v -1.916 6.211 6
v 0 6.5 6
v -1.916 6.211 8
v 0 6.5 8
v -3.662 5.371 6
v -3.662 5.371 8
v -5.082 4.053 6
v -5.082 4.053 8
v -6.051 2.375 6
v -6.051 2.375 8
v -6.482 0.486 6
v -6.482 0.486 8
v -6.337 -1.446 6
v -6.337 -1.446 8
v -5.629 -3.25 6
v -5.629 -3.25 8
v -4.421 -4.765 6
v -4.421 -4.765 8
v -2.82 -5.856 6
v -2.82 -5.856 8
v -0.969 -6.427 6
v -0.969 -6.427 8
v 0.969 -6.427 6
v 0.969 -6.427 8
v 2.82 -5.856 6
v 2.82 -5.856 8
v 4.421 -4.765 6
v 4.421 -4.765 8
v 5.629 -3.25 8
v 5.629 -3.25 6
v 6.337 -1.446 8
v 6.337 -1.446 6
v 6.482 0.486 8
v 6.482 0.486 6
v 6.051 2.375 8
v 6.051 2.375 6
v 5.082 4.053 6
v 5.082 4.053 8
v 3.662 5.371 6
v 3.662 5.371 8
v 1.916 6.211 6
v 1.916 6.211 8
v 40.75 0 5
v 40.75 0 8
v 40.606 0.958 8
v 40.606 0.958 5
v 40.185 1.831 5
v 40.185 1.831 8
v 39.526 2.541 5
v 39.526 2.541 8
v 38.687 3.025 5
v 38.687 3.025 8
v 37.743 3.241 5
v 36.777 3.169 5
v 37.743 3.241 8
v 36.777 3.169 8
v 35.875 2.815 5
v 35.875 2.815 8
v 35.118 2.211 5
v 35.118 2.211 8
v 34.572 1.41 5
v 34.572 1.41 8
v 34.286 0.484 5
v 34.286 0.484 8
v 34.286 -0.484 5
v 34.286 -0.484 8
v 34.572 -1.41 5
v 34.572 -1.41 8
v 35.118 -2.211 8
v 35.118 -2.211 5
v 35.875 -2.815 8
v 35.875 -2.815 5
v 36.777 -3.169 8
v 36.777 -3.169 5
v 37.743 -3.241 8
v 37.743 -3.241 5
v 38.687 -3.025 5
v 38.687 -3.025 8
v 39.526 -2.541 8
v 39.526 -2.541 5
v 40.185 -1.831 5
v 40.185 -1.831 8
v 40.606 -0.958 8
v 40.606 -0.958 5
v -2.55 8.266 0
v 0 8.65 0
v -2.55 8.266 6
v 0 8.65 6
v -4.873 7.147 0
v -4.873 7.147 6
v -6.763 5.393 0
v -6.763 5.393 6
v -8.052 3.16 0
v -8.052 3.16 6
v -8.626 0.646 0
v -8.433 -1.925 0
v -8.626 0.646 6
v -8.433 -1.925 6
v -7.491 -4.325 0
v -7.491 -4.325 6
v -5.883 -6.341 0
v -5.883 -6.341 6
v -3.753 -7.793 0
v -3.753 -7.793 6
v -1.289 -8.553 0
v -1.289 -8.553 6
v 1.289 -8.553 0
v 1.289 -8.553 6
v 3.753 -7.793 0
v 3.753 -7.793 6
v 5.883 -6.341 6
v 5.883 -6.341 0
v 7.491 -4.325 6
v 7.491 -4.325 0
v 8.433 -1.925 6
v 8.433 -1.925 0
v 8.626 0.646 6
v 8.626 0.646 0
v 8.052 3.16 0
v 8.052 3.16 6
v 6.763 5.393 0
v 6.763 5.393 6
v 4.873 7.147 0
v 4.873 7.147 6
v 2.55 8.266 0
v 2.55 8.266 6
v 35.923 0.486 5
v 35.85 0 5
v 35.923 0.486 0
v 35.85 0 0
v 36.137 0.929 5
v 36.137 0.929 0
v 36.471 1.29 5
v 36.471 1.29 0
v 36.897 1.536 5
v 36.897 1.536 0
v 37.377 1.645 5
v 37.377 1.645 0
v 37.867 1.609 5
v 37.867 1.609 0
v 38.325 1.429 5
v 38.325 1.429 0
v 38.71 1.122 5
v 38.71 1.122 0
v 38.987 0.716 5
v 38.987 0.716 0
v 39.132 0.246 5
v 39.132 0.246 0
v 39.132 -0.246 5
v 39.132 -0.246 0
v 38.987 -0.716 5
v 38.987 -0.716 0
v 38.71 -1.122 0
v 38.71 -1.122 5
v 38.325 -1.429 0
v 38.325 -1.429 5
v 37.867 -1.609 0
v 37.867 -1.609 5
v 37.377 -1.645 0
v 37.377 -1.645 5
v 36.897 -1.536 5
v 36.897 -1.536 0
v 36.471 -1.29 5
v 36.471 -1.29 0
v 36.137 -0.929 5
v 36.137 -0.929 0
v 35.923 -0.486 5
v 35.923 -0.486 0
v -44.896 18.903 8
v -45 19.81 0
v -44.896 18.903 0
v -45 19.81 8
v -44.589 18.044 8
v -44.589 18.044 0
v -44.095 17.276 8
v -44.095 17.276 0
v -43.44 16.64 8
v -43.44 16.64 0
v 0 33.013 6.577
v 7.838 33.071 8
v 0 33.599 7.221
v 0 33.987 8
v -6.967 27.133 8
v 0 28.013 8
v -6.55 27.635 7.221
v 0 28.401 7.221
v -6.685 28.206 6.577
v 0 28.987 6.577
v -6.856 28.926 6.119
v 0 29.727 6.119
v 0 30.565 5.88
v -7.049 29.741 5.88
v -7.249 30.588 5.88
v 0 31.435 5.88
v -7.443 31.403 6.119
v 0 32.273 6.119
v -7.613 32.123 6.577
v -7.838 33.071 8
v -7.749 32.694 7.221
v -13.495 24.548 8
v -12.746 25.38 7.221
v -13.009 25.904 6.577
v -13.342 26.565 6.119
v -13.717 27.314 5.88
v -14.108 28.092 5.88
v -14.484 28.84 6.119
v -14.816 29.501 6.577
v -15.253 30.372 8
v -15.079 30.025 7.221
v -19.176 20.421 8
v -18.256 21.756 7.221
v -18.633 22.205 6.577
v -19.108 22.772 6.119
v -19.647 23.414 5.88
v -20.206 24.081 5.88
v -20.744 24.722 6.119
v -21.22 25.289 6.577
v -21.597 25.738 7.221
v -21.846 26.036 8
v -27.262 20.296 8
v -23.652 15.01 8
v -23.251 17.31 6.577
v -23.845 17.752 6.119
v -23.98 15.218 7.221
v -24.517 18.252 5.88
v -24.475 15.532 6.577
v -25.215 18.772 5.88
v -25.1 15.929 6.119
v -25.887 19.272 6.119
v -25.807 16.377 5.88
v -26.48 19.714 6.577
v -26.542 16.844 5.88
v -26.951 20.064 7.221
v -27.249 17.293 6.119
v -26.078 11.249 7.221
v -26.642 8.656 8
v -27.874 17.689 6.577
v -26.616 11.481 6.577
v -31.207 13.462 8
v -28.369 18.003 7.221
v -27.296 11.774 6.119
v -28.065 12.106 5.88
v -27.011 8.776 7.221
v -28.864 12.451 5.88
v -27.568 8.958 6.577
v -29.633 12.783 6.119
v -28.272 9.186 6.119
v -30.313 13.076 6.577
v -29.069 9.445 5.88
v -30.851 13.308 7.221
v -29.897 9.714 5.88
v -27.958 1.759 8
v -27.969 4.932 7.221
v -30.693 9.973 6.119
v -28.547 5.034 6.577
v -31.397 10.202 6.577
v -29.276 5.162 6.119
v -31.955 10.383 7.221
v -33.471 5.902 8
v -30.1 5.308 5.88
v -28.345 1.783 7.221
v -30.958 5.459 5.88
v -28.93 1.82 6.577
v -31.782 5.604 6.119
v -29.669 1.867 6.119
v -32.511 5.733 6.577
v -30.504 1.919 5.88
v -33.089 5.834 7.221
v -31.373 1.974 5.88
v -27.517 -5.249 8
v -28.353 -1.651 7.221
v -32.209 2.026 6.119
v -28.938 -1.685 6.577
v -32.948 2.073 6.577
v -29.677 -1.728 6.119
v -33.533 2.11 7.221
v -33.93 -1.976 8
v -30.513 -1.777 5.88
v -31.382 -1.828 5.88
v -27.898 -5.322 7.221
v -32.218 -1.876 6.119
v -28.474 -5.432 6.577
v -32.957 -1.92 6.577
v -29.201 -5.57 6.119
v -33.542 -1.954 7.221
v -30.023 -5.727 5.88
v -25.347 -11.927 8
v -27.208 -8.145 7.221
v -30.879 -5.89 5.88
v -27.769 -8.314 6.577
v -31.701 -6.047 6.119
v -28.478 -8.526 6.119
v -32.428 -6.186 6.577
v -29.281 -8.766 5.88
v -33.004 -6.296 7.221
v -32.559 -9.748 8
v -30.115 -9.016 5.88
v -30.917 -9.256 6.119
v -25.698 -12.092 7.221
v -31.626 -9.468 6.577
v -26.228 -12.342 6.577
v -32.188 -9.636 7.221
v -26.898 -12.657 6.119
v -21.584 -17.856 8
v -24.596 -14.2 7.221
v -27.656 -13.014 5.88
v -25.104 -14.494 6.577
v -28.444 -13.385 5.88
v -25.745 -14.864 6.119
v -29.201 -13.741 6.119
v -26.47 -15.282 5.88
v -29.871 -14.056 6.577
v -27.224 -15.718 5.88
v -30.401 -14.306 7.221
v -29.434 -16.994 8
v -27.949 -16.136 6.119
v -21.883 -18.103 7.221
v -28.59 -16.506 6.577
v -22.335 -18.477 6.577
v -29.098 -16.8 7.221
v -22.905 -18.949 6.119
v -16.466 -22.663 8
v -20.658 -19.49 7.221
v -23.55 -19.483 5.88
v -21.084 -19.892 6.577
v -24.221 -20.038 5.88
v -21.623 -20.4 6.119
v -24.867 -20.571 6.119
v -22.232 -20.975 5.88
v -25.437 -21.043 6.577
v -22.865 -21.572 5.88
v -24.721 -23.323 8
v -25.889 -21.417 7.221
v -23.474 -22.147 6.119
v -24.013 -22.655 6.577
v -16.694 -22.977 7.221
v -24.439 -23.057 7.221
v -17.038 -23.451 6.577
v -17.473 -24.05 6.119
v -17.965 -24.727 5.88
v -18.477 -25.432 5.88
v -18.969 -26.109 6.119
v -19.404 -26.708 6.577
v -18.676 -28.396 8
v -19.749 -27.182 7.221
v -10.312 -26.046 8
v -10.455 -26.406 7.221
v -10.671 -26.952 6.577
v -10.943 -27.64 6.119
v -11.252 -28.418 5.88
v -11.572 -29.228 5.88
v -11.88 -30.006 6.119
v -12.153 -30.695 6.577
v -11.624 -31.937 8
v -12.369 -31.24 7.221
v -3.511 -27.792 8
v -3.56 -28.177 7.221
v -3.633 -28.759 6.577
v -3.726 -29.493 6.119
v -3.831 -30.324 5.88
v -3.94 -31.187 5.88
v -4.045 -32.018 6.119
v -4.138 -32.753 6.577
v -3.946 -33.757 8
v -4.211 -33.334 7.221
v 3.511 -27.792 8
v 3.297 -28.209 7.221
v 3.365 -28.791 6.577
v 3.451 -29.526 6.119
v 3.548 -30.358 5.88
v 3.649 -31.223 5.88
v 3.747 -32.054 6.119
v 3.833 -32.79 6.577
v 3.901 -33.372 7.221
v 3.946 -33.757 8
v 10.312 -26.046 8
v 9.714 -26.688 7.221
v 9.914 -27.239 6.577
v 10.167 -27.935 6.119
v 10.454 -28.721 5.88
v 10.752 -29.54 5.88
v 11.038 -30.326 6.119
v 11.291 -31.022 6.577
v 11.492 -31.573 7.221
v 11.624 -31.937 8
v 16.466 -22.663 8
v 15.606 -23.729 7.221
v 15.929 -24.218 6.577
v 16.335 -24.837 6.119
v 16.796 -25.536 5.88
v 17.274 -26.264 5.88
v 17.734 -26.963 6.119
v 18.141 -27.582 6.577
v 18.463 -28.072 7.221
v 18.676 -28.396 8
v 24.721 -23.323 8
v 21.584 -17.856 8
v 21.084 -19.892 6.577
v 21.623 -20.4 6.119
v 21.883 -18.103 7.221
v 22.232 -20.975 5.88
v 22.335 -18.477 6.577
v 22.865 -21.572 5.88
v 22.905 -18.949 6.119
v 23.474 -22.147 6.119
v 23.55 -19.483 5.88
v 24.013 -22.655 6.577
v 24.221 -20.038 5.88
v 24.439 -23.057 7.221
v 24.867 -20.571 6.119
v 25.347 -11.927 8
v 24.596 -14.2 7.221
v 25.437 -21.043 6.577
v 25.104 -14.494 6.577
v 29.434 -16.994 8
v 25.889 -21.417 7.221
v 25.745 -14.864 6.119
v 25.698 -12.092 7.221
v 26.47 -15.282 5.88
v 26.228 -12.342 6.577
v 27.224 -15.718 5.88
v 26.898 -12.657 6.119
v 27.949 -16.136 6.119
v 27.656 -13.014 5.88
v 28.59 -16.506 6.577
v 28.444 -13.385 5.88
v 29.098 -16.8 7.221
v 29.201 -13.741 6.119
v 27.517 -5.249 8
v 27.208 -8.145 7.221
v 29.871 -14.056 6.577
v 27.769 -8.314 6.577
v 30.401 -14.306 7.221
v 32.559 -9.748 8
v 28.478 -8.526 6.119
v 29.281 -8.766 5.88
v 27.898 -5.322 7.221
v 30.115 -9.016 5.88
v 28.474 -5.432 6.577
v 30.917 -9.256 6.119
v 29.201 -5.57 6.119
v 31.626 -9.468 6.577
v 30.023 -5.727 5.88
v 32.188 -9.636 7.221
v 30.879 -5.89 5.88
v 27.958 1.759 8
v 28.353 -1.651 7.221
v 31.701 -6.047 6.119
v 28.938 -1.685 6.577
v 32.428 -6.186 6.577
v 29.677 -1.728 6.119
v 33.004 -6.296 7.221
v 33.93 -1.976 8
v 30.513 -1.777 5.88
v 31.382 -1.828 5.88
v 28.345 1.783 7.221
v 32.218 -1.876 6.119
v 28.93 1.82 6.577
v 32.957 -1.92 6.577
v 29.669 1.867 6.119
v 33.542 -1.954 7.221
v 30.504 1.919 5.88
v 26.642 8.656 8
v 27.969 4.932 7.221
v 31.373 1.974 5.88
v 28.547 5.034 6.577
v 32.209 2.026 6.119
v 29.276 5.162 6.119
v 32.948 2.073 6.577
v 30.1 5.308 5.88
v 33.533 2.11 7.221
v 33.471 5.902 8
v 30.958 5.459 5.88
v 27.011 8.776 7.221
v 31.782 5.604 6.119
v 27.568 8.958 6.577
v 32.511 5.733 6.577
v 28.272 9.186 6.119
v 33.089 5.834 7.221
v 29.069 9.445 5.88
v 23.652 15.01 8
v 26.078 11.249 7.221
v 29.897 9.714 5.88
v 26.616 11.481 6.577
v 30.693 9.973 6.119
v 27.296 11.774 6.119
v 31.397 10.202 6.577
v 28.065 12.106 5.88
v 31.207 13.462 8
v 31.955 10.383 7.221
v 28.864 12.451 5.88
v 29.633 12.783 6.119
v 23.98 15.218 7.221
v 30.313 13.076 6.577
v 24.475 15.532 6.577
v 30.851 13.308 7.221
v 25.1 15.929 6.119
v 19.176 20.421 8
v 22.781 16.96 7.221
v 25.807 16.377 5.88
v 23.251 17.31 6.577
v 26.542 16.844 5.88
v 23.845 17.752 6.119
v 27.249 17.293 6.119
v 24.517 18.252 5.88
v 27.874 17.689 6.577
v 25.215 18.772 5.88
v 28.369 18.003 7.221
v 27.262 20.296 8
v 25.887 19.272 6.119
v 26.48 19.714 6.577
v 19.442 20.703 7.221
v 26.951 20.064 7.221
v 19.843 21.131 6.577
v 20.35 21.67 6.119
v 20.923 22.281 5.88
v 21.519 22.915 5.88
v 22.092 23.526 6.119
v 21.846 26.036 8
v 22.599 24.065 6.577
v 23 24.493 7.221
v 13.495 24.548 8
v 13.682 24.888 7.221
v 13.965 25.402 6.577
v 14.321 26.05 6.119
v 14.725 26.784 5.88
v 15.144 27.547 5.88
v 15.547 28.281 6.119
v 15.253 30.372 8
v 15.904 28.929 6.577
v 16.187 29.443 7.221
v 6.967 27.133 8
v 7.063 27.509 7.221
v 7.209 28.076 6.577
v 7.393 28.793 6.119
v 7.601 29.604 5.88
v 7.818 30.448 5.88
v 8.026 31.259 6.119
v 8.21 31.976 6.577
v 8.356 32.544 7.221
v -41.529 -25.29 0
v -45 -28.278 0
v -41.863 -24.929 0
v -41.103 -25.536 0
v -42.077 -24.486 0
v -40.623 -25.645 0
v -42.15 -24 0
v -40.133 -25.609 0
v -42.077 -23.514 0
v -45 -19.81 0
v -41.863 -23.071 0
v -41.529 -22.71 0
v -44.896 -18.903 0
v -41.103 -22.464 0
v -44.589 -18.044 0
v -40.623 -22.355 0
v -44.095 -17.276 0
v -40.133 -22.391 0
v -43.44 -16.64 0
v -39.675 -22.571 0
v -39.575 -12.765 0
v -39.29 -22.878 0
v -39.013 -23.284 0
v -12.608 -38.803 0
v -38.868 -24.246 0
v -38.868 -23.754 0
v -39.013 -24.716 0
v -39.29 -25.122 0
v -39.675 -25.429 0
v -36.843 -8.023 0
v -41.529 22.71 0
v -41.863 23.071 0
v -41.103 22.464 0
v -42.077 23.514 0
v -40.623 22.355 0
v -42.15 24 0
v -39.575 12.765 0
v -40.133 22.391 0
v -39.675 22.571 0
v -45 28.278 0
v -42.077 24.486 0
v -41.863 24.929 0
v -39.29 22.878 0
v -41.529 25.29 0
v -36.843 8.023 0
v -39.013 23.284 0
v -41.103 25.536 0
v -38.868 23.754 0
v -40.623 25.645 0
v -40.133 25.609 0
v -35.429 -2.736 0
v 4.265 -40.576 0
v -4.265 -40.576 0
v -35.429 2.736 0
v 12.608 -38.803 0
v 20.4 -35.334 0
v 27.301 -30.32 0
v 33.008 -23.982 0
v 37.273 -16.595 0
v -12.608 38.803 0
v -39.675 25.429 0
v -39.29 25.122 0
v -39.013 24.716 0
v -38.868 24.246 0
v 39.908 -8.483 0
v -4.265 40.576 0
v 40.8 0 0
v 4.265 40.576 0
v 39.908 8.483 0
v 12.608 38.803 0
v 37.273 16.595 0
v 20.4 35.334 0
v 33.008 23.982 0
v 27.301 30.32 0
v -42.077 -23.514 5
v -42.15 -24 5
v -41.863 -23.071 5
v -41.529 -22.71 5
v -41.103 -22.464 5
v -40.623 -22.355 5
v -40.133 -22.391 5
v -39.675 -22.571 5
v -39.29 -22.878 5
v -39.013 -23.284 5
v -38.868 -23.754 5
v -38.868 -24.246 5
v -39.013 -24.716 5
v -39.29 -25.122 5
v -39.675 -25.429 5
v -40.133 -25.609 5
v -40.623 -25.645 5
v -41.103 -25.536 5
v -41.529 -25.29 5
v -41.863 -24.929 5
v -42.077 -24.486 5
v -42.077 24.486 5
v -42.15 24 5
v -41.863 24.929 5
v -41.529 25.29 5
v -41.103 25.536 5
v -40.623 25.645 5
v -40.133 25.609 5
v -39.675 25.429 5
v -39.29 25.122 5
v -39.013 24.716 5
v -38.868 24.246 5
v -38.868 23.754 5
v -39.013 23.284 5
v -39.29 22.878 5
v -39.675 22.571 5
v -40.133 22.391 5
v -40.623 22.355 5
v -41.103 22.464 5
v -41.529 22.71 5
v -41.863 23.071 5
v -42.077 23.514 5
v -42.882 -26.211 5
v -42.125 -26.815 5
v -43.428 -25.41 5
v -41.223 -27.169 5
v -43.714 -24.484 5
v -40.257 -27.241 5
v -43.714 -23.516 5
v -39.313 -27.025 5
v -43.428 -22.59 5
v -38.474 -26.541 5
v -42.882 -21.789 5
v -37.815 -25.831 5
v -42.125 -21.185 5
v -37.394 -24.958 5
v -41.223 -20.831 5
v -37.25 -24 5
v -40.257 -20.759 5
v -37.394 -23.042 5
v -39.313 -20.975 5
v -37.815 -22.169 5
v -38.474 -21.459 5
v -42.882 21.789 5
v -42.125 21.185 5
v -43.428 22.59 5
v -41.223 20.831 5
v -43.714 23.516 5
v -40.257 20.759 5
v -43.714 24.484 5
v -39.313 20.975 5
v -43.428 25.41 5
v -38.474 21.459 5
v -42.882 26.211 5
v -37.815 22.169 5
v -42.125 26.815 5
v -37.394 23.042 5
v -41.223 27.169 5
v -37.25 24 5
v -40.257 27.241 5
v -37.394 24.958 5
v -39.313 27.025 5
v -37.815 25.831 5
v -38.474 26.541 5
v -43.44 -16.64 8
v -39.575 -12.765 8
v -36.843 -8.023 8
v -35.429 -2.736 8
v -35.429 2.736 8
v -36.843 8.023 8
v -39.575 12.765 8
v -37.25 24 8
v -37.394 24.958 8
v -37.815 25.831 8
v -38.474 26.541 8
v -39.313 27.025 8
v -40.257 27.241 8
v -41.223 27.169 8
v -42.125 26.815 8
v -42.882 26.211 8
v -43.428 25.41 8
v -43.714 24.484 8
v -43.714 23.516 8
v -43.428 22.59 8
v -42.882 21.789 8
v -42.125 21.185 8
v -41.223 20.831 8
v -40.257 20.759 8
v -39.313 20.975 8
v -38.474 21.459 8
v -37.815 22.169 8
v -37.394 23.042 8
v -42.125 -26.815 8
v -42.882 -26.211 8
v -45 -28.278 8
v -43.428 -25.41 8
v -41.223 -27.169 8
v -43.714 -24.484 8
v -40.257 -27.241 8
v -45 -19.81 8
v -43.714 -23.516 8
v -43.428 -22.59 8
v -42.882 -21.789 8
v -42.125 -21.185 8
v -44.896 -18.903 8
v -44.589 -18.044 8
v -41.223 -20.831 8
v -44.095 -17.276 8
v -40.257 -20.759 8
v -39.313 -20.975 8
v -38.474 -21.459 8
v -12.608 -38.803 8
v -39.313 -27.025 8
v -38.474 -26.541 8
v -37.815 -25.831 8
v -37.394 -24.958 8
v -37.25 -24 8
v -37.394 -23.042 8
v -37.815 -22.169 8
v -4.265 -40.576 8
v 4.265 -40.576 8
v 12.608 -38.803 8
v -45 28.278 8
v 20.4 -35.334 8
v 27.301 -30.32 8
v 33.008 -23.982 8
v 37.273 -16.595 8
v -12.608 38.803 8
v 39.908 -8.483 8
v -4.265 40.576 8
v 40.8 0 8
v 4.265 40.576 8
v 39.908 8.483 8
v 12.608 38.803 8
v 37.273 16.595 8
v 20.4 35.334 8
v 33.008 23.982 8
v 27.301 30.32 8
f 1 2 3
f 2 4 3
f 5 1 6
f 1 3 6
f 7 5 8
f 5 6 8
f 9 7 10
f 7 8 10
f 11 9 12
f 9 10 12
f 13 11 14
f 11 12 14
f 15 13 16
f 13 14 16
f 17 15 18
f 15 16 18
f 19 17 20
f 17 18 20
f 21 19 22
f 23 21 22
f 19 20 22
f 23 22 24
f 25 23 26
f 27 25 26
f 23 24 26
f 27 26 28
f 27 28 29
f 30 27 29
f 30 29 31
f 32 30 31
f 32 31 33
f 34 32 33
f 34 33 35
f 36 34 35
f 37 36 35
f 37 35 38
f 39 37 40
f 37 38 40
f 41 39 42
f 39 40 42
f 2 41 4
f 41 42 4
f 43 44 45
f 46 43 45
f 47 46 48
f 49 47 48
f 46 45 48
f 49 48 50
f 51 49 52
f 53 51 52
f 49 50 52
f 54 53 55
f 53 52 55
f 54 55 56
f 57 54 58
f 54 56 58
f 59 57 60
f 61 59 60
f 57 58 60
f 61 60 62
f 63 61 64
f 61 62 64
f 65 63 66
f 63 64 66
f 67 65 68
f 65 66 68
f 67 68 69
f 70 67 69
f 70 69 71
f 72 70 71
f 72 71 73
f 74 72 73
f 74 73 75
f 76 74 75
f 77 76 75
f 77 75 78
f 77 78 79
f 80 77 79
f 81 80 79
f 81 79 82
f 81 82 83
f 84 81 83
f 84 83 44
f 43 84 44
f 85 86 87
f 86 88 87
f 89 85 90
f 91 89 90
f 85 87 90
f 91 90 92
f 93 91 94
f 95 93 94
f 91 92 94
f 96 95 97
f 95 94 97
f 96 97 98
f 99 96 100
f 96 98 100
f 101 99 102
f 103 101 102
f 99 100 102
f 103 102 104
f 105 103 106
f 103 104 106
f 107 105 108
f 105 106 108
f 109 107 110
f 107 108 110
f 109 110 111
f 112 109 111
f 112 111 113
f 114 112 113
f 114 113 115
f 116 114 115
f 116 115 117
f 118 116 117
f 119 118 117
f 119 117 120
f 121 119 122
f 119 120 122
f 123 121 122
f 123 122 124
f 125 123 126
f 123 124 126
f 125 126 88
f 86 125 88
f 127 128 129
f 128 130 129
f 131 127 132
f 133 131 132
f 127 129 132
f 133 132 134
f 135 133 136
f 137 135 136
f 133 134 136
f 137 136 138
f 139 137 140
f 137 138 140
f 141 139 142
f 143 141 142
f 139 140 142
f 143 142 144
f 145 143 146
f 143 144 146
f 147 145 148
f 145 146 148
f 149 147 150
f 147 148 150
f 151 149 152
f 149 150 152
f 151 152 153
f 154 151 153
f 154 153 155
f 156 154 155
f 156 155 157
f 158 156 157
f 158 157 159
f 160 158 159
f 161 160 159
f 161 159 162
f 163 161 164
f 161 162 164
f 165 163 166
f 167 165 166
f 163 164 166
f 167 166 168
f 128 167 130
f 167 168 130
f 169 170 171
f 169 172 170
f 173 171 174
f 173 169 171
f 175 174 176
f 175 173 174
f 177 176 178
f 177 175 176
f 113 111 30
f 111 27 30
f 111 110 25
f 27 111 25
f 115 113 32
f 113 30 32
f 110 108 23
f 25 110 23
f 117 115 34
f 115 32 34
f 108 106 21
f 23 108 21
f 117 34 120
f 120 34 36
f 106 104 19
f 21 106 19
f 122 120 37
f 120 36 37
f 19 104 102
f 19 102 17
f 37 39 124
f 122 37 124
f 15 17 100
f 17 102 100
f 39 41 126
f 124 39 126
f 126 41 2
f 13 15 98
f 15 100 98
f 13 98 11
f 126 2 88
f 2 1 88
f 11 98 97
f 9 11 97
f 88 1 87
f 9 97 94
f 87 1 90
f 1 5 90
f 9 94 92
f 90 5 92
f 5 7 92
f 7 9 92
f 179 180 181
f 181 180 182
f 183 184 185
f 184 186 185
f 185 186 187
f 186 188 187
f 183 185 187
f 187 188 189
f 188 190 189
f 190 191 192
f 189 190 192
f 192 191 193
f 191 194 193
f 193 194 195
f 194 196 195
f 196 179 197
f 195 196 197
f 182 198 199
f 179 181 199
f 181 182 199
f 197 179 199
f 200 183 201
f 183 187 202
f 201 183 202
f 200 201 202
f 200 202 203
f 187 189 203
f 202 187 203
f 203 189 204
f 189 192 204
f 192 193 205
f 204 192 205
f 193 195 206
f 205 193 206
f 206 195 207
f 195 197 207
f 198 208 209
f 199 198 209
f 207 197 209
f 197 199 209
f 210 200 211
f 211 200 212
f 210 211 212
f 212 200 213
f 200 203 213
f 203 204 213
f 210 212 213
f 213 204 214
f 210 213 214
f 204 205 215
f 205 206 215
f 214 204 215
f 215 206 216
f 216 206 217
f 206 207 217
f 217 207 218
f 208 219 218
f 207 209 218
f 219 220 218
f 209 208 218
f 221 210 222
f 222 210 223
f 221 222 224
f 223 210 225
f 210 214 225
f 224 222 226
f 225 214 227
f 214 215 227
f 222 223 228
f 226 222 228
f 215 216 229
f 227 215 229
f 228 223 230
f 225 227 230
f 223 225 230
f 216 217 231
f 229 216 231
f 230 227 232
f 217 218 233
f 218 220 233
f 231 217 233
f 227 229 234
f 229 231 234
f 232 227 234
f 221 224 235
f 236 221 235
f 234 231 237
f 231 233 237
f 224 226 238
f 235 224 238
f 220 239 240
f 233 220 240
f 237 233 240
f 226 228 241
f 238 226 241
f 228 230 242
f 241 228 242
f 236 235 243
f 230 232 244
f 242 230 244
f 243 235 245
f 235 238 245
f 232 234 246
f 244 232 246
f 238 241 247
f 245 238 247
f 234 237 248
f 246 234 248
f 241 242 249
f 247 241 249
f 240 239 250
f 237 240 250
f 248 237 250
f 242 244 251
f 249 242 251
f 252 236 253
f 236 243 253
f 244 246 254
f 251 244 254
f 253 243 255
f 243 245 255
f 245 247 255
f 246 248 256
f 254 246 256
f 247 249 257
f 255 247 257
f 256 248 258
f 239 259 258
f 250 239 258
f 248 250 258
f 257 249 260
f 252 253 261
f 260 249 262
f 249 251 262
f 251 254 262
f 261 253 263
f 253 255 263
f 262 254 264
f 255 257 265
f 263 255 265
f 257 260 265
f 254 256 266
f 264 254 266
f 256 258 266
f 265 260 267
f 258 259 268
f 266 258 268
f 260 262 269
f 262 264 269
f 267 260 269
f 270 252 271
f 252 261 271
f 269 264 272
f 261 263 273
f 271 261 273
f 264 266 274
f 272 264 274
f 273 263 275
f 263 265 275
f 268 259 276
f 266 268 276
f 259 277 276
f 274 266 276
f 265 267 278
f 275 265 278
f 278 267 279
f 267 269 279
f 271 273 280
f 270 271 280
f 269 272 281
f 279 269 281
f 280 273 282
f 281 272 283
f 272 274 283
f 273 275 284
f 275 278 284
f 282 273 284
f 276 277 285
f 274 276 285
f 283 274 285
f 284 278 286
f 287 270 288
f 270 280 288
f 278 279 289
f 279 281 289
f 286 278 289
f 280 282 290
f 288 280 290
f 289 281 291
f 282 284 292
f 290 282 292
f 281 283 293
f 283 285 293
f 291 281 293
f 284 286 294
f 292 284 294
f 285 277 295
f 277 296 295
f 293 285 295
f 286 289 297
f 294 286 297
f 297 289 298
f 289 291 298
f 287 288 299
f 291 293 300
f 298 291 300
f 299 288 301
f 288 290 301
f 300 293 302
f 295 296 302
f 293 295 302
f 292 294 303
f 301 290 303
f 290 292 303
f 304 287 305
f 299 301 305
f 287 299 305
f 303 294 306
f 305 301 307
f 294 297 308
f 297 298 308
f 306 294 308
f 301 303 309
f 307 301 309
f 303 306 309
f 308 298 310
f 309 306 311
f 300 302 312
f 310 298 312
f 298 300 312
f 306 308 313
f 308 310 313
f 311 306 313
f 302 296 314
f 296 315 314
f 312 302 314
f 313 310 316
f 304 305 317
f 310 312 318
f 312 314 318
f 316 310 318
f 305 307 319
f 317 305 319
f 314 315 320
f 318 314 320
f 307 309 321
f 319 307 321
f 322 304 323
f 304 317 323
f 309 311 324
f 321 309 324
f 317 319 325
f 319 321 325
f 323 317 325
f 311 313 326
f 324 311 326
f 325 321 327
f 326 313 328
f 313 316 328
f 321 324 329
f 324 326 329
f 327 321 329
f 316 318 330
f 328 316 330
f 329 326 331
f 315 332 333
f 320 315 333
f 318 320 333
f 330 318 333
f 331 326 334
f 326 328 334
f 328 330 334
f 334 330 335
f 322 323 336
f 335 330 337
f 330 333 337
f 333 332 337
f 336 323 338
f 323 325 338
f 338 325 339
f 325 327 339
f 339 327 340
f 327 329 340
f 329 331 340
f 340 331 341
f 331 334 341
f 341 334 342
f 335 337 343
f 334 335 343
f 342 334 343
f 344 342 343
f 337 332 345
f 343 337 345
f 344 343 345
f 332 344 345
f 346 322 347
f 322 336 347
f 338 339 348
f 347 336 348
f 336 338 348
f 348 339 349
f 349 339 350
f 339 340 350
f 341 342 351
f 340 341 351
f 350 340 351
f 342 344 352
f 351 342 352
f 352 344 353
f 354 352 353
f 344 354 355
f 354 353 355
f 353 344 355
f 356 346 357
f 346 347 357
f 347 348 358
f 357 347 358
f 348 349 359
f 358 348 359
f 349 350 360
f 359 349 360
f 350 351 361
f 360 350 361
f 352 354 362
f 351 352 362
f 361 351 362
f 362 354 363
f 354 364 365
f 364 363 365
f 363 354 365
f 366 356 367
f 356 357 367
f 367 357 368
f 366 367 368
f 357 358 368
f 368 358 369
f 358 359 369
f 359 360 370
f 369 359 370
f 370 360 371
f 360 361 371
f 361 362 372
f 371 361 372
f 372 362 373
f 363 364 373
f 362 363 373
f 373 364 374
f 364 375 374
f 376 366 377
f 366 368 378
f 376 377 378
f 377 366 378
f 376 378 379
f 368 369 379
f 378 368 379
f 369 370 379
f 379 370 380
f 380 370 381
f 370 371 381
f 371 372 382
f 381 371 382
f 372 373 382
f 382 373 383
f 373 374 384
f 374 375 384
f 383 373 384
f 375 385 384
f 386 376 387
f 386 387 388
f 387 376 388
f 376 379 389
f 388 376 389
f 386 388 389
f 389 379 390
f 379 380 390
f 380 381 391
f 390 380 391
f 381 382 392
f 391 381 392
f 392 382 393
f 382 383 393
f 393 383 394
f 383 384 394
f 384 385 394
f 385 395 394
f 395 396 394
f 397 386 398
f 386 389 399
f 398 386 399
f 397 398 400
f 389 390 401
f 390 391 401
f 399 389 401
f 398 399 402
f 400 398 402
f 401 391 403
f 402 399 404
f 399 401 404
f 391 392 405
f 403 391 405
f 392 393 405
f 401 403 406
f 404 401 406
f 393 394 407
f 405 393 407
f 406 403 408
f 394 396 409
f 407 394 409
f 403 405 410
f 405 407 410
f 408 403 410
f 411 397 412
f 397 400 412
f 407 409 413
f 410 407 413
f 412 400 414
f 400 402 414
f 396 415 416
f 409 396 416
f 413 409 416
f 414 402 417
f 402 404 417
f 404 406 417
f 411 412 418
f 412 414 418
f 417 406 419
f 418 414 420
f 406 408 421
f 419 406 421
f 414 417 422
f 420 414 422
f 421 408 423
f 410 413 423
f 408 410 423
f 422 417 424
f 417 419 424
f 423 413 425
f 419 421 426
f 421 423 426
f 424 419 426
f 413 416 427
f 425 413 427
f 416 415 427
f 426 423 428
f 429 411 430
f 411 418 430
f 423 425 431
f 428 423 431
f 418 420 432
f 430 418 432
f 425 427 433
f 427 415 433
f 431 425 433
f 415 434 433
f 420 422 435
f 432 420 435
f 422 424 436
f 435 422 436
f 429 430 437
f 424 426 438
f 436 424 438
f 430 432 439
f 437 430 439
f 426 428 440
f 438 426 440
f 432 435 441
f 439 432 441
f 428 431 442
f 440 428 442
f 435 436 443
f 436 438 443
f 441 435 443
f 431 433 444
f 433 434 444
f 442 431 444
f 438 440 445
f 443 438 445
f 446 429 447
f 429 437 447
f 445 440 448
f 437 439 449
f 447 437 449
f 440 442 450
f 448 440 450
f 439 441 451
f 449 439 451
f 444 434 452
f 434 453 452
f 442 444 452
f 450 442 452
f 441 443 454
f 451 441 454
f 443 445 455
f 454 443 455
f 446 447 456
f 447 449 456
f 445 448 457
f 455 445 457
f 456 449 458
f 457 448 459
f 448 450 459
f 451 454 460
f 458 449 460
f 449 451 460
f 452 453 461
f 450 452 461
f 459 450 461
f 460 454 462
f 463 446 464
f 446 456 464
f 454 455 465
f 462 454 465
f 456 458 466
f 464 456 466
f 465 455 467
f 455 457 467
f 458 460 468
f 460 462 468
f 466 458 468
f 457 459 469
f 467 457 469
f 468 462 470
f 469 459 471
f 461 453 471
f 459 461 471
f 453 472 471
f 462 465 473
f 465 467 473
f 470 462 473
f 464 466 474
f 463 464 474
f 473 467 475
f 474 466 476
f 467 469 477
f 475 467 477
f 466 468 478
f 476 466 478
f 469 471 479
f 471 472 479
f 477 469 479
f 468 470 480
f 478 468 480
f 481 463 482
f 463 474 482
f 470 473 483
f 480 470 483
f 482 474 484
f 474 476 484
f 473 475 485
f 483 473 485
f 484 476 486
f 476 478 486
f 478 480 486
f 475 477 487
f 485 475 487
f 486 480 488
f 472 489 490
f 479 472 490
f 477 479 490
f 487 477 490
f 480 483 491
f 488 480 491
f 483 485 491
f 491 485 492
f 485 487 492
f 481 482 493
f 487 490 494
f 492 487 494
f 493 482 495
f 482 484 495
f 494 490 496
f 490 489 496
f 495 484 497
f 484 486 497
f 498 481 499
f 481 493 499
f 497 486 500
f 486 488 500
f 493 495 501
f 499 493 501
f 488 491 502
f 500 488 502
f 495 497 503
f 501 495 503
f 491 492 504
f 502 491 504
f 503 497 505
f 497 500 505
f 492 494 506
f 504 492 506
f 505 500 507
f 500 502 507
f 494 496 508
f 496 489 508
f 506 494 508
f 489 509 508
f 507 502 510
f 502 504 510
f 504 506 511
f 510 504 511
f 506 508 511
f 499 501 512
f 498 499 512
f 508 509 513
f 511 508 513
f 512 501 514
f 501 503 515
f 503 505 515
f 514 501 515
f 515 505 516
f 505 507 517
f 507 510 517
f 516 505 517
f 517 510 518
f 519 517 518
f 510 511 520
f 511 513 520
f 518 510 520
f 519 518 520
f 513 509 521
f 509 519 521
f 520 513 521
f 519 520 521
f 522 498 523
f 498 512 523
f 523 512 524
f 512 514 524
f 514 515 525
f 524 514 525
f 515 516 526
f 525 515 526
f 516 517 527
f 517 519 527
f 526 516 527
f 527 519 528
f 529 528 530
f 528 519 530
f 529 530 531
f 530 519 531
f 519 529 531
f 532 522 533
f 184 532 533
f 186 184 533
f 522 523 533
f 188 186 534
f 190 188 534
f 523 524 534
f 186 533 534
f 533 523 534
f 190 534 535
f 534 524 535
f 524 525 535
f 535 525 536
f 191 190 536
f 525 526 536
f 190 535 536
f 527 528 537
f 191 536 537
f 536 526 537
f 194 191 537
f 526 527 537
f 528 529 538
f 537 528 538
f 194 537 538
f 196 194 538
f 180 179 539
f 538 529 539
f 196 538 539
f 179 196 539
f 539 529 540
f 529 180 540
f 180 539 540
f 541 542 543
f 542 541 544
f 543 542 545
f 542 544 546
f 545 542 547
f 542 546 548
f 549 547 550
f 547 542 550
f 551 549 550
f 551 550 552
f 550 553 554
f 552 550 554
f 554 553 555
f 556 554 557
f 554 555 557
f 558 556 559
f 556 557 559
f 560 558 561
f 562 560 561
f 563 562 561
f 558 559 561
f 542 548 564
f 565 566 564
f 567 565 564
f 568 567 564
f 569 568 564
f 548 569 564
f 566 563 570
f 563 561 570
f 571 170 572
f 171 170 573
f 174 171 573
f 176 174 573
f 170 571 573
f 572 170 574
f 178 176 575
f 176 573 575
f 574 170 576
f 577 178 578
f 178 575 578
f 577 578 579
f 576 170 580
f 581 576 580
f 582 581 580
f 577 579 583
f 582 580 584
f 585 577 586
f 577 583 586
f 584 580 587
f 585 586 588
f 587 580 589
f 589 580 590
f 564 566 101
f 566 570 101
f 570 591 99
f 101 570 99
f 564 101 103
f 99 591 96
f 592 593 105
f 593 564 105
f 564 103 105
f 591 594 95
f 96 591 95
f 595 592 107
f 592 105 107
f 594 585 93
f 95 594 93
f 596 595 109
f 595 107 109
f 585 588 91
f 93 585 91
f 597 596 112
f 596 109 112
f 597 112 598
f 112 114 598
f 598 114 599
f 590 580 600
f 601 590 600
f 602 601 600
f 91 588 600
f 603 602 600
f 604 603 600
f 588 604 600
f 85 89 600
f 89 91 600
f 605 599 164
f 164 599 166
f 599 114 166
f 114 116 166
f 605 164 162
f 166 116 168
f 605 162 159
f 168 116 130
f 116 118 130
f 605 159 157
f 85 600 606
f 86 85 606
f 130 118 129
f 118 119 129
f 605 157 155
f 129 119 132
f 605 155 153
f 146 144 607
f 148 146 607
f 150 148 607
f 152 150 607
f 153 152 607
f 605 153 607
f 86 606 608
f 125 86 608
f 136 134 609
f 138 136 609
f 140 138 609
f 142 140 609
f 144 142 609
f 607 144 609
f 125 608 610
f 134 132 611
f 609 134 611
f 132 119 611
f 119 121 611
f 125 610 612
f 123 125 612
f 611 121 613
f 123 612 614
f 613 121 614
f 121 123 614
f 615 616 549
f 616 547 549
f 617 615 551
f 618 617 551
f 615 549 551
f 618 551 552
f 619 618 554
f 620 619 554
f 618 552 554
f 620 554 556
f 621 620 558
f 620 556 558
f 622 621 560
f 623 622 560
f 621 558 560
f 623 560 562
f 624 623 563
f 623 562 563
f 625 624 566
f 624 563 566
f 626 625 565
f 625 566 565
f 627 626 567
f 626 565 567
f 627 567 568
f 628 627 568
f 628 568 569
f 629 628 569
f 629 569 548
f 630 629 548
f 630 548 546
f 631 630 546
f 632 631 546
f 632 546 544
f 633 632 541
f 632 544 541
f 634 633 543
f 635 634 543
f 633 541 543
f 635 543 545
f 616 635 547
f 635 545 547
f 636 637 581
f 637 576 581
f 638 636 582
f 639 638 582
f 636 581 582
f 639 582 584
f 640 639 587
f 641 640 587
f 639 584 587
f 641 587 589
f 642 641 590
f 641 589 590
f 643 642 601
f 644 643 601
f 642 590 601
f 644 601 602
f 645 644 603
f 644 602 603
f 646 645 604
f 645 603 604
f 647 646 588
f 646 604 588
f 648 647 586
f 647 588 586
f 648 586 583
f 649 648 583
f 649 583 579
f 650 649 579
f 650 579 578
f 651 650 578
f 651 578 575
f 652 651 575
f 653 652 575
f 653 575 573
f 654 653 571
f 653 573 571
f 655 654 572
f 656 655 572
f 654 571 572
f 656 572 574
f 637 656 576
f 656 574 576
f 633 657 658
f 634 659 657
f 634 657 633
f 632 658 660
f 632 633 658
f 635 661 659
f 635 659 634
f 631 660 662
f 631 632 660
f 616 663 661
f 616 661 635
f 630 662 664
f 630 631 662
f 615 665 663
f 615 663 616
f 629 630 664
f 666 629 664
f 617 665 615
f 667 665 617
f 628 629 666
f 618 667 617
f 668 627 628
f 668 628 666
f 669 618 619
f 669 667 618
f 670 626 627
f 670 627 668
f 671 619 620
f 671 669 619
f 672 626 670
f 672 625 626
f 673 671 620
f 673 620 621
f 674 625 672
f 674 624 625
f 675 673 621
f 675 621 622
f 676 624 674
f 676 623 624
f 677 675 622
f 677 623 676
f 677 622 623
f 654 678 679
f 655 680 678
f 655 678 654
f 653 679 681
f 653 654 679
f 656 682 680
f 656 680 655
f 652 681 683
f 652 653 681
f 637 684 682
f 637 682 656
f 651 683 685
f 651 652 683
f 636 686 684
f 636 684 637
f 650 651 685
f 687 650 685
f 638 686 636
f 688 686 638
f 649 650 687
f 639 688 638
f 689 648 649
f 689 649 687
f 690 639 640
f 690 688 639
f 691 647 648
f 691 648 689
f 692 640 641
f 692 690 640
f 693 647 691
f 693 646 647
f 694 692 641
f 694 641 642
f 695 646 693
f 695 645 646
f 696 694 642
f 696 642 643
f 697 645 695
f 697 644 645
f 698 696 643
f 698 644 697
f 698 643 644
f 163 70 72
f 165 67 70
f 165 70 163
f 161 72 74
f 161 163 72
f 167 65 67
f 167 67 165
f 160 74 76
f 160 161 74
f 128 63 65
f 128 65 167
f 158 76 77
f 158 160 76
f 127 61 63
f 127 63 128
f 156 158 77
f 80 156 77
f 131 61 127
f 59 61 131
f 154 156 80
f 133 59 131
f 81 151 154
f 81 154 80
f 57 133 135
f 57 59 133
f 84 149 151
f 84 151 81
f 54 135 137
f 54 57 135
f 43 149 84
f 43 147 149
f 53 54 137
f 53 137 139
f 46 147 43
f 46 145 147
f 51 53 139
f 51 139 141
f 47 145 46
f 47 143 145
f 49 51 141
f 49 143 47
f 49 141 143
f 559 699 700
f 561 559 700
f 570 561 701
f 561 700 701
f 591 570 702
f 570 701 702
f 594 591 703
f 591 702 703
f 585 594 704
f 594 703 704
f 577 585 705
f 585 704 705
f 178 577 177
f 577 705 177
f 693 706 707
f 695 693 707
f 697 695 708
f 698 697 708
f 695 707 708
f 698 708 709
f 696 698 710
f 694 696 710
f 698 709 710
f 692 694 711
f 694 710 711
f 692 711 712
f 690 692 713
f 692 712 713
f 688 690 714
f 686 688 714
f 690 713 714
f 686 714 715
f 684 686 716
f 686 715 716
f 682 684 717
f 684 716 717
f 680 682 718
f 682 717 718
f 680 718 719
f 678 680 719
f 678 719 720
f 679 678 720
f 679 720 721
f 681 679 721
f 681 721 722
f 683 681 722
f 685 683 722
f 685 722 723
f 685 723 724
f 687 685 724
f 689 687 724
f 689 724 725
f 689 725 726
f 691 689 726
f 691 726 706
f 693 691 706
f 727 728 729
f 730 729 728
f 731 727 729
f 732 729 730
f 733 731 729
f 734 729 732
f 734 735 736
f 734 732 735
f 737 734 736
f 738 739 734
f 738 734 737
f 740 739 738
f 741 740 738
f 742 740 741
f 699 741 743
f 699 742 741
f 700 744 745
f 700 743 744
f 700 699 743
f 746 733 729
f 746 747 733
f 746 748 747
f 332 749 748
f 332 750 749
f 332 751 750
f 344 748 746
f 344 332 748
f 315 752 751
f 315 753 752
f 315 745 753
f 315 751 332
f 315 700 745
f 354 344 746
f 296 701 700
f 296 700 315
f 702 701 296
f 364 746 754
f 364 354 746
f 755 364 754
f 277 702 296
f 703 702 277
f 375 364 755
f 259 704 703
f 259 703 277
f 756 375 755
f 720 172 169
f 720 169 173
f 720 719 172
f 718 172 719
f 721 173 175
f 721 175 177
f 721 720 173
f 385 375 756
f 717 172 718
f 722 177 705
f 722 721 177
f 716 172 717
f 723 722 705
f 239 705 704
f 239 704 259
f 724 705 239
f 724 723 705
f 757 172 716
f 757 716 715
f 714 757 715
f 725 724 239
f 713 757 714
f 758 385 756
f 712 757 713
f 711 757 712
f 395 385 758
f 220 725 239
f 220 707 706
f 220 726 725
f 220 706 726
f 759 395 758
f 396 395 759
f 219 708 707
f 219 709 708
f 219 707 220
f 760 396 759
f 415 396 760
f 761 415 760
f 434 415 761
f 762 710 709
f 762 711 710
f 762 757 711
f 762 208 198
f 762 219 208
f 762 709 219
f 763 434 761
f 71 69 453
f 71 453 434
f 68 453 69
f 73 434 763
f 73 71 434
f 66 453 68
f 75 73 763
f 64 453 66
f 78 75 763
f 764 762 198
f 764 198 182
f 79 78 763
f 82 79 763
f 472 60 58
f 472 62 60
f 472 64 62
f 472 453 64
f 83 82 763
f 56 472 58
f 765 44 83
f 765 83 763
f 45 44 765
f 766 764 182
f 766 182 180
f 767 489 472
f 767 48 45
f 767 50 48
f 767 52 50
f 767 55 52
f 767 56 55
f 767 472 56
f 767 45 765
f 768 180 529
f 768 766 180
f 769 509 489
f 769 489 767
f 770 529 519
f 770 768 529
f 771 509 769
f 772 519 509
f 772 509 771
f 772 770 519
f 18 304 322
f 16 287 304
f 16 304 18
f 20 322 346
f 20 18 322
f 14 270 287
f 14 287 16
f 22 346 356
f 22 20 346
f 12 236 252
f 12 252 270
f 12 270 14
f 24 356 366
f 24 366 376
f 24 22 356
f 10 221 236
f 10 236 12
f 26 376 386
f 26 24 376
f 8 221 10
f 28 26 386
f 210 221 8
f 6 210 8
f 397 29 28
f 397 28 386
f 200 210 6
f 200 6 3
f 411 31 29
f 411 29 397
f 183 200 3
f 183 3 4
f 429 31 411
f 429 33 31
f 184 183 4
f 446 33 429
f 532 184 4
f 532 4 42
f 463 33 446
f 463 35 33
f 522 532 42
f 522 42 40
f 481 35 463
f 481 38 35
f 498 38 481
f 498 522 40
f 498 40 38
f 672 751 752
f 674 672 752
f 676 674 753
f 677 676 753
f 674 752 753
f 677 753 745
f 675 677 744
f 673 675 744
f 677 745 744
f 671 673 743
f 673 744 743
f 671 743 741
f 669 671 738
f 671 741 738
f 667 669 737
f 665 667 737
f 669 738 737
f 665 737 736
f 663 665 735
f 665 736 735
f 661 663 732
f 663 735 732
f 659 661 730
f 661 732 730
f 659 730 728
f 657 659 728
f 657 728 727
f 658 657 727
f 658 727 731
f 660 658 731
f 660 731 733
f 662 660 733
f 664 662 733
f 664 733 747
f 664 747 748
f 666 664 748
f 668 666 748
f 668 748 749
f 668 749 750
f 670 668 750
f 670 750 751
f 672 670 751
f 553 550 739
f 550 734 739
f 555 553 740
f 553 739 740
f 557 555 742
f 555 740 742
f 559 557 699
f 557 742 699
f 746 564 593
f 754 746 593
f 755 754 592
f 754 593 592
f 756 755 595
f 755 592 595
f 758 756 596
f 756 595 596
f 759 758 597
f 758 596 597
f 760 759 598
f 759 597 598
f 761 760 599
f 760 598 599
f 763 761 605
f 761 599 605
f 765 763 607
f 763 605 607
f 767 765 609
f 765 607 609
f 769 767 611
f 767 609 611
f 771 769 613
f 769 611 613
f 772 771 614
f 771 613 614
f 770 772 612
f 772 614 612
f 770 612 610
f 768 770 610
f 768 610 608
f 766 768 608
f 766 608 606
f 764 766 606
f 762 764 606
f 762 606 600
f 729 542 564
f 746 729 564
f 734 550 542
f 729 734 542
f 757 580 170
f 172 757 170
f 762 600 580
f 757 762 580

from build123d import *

# Parameters (mm, degrees)
F0_R            = 40.8
F1_DEPTH        = 8
F4_R            = 3.15
F8_DEPTH        = 8
F9_R            = 21
F10_DEPTH       = 8.001
F11_R           = 4
F13_D           = 3.3
F13_CBORE_D     = 6.5
F13_CBORE_DEPTH = 3


with BuildPart() as f1:
    # F0 (on Top) → F1 (new body)
    with BuildSketch(Plane.XY):
        Circle(F0_R)
    extrude(amount=F1_DEPTH)

    # F2 (on Right) → F3 (revolve, cut)
    with BuildSketch(Plane.YZ):
        Polygon((0, 8), (0, 0), (8.65, 0), (8.65, 6), (6.5, 6), (6.5, 8), align=None)
    revolve(axis=Axis((0, 0, 10.7360328796), (0, 0, 1)), mode=Mode.SUBTRACT)

    # F4 (on Right) → F5 (revolve, cut)
    with BuildSketch(Plane.YZ):
        with Locations((31, 9)):
            Circle(F4_R)
    revolve(axis=Axis((0, 0, 6.3867427816), (0, 0, 1)), mode=Mode.SUBTRACT)

    # F7 (on Top) → F8 (join, through all)
    with BuildSketch(Plane.XY):
        with BuildLine():
            Line((-45, 28.2782724184), (-45, -28.2782724184))
            Line((-45, -28.2782724184), (-12.6078933705, -38.8031058648))
            ThreePointArc((-12.6078933705, -38.8031058648), (-26.2059585661, -31.2711965814), (-36, -19.2))
            Line((-36, -19.2), (-36, 19.2))
            ThreePointArc((-36, 19.2), (-26.2059585661, 31.2711965814), (-12.6078933705, 38.8031058648))
            Line((-12.6078933705, 38.8031058648), (-45, 28.2782724184))
        make_face()
    extrude(amount=F8_DEPTH)

    # F9 (on face) → F10 (cut, through all)
    with BuildSketch(Plane.XY.offset(8)):
        with Locations((-56.25, 0)):
            Circle(F9_R)
    extrude(amount=-F10_DEPTH, mode=Mode.SUBTRACT)

    # F11
    f11_edges = [f1.edges().sort_by_distance(p)[0] for p in [
        (-45, 17.732386, 4),
        (-45, -17.732386, 4),
    ]]
    fillet(f11_edges, radius=F11_R)

    # F13 (through all)
    with Locations(Plane.XY.offset(8)):
        with Locations((-40.5, 24), (-40.5, -24), (37.5, 0)):
            CounterBoreHole(F13_D / 2, F13_CBORE_D / 2, F13_CBORE_DEPTH)


solid = f1.part
